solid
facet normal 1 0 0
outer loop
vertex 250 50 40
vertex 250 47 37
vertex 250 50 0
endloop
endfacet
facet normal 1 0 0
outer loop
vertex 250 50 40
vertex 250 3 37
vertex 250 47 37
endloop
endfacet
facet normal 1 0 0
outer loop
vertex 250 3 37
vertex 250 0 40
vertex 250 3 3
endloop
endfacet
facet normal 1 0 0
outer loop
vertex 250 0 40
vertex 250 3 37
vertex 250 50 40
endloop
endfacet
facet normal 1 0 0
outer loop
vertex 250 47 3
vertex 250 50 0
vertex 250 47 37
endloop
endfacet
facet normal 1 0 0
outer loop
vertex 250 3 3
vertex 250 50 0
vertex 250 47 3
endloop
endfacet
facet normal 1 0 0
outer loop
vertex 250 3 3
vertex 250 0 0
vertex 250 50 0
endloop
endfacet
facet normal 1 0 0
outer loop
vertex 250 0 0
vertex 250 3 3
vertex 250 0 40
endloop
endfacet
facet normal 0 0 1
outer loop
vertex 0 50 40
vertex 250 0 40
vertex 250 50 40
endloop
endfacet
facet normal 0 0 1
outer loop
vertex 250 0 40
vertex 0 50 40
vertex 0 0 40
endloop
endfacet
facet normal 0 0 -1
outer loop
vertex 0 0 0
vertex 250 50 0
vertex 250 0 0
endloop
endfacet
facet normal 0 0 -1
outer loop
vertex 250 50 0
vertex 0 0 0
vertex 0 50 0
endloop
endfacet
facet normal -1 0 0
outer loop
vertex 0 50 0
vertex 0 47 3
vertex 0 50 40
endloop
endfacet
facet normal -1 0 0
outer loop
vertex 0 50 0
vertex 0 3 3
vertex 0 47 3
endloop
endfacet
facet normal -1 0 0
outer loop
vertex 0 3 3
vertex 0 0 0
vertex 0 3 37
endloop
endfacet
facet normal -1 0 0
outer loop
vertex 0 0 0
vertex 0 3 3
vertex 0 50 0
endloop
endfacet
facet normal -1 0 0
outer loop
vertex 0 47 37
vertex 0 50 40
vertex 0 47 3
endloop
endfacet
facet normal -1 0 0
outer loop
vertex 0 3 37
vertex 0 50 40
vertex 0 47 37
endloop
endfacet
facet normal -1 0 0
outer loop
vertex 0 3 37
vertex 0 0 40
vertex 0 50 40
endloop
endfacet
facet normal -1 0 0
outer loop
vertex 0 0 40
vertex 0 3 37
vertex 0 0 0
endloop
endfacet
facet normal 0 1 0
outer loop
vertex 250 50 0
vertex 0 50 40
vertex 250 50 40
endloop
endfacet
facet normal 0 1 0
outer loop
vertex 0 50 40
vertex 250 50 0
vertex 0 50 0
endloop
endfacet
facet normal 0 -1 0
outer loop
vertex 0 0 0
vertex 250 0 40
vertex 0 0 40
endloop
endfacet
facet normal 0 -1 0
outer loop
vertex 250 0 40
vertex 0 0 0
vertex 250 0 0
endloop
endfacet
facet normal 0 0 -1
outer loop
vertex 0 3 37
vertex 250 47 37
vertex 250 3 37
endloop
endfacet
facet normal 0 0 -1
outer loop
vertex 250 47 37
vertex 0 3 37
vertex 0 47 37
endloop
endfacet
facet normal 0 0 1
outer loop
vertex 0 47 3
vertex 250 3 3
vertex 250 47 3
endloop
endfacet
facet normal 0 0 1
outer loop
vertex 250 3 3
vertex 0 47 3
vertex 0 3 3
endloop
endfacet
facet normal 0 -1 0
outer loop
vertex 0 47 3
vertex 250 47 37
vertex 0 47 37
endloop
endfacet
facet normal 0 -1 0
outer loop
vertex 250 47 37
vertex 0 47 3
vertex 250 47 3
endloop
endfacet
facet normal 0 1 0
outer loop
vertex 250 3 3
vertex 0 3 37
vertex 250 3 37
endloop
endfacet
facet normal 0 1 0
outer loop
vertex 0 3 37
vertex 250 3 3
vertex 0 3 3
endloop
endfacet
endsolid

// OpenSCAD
$fn = 32;

// ----------------------------------------------------------------------
// Box beam: 200-250 mm hollow beam
// ----------------------------------------------------------------------

// --- parameters (mm) ---
beam_l = 250;             // beam length, X
beam_w = 50;              // beam width, Y
beam_h = 40;              // beam height, Z
wall = 3;                 // wall thickness

difference() {
  cube([beam_l, beam_w, beam_h]);
  translate([-1, wall, wall])
    cube([beam_l + 2, beam_w - 2 * wall, beam_h - 2 * wall]);
}
